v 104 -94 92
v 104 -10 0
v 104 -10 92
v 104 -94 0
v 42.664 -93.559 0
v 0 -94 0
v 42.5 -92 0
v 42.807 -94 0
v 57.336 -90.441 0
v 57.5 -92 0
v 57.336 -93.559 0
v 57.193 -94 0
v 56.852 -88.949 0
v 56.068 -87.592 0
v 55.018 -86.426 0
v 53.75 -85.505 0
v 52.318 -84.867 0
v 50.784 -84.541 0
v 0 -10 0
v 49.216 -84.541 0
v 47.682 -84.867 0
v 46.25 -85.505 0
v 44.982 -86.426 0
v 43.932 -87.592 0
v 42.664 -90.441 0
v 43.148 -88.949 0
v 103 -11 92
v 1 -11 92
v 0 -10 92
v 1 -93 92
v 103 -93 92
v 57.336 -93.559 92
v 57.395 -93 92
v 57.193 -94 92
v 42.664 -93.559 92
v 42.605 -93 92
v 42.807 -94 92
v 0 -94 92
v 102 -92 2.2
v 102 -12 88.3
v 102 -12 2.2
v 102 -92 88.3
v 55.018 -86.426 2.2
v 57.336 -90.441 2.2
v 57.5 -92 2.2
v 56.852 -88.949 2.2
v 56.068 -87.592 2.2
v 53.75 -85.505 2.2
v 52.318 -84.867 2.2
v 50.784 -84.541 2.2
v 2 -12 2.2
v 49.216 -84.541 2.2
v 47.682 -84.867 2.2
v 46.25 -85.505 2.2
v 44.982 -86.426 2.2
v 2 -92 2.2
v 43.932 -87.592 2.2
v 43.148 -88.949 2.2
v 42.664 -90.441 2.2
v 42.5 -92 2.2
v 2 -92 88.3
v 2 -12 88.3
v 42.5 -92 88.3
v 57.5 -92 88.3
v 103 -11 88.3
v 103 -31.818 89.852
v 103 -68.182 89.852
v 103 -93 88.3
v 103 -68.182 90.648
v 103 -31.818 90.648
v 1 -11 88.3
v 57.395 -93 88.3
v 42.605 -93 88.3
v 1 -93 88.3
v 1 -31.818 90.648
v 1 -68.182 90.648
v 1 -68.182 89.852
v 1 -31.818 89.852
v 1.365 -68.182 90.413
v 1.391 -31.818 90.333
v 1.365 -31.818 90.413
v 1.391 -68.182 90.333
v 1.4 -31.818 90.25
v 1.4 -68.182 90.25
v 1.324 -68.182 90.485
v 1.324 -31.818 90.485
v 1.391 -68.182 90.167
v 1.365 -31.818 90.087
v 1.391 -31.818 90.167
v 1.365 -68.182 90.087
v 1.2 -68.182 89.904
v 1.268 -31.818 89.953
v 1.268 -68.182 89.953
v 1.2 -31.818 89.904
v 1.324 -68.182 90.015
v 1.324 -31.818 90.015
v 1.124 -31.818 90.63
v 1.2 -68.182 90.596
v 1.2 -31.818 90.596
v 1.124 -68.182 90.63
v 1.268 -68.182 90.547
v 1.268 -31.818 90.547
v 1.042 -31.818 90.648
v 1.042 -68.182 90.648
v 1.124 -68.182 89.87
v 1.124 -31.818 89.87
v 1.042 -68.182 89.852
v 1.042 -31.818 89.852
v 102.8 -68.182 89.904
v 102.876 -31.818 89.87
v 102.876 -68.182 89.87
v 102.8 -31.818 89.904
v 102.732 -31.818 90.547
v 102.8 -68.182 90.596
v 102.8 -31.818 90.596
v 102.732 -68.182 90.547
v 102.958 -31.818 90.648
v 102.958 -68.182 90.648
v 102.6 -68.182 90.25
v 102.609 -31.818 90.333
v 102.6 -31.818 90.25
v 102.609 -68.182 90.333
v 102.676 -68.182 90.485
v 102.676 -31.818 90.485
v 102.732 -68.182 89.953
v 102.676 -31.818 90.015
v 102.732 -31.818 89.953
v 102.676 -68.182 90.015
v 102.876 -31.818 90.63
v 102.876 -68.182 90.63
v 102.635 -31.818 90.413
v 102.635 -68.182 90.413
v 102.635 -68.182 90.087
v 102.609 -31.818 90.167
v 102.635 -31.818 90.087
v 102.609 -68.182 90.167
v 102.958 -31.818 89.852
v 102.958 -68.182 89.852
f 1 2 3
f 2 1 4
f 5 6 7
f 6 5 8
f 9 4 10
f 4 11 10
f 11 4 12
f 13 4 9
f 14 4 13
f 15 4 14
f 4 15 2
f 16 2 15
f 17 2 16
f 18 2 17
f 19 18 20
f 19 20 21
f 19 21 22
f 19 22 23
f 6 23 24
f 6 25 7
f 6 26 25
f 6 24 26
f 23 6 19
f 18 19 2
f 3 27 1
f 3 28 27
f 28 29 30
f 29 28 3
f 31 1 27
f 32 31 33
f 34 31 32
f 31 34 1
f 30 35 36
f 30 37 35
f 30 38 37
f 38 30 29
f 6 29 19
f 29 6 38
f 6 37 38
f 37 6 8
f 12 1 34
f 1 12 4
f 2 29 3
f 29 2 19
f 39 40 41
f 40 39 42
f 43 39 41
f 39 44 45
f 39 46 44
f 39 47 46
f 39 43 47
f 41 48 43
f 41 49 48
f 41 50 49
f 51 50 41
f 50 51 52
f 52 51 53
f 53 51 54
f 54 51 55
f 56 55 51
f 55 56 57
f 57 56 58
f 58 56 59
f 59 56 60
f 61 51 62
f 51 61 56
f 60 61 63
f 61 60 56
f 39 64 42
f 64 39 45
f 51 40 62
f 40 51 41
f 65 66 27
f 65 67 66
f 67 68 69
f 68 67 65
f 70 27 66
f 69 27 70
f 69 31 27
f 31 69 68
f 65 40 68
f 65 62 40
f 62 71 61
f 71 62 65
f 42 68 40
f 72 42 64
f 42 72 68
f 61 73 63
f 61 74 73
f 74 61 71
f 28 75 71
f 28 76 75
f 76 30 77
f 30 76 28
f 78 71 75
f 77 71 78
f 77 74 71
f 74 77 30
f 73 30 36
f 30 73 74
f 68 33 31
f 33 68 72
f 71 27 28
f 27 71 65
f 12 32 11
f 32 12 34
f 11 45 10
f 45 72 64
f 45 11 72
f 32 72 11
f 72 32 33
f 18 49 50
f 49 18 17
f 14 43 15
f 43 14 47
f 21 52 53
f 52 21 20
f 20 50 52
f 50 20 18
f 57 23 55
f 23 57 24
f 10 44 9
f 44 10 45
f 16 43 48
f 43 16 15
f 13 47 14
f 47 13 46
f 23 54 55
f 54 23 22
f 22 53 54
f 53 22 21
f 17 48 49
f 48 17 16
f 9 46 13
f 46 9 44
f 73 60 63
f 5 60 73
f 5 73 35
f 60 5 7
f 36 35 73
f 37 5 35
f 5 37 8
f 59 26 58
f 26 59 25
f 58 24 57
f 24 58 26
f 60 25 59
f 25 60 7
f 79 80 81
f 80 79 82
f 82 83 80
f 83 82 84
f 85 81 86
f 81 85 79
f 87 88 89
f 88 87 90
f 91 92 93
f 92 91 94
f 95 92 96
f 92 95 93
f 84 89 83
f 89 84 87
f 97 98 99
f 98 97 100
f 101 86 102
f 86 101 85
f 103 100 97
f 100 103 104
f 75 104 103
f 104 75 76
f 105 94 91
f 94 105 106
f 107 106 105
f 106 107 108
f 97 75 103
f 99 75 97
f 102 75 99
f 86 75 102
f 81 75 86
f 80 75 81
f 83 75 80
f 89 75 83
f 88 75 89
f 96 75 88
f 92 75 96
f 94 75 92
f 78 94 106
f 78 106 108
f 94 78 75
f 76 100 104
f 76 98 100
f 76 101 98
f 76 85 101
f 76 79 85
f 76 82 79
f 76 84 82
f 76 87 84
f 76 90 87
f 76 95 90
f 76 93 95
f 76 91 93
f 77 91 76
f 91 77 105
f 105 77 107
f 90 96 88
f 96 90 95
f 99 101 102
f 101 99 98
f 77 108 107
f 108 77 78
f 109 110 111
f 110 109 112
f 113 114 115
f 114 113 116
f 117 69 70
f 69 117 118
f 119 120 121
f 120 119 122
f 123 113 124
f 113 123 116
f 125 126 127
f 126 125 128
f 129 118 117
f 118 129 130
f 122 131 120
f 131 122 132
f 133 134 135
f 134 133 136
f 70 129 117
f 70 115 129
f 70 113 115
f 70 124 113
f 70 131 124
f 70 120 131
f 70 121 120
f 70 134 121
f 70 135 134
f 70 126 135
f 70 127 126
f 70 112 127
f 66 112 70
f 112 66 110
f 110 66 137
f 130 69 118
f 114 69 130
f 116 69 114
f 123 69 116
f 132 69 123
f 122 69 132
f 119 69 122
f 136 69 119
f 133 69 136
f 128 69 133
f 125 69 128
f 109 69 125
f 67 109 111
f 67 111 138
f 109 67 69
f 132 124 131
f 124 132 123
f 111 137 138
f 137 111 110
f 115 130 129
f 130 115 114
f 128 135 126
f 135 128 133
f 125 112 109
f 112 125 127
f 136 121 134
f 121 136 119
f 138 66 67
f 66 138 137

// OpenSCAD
wallthickness = 1; // this is the wall of the lip, the box is twice as thick
internalx = 100; // internal x dimension
internaly = 80; // internal y dimension
internalz = 60; // internal overall z dimension
internal_lidz=90; // this is taken of off the internalz for the bottom height and acts as the lid internal height
led_x = 62.4;
led_y = 40.2;
cable_hole = 6;
rotary_hole = 6.9/2;

lip_overlap = 3.5; // how much overlap between box and lid, this works as a default but can be shrunk as needed

//#############################
// INTERNAL VARIABLES, DO NOT MODIFY
internal_botz=internalz-lip_overlap*2;

actual_y=internaly+(4*wallthickness);
actual_x=internalx+(4*wallthickness);
actual_lidz=internal_lidz+(2*wallthickness);
actual_botz=internal_botz+(2*wallthickness);

lip_x = internalx+(2*wallthickness);
lip_y = internaly+(2*wallthickness);

echo(actual_y);
echo(actual_x);
echo(actual_lidz);
echo(internal_lidz);
echo(lip_x);
echo(lip_y);

//###########################
module led() {
  cube([led_x, led_y, lip_overlap+.3]);
}

module rotary() {
  cylinder(r = rotary_hole, h = actual_lidz+lip_overlap, $fn = 30);
}

module bottom() {
  difference() {
    union() {
      cube([actual_x,actual_y,actual_botz]);
      translate([wallthickness,wallthickness,actual_botz])
        cube([lip_x,lip_y,lip_overlap]);
        
    }
    translate([(2*wallthickness),(2*wallthickness),(2*wallthickness)])
      cube([internalx,internaly,internalz]);

    // lock
    translate([wallthickness, internaly/4, actual_botz+lip_overlap/2])
      rotate([-90,0,0])
        cylinder(r = 0.5, h = internaly/2, $fn = 30);
    translate([lip_x+wallthickness, internaly/4, actual_botz+lip_overlap/2])
      rotate([-90,0,0])
        cylinder(r = 0.5, h = internaly/2, $fn = 30);


    translate([(2*wallthickness+internalx/2-led_x/2),(2*wallthickness+internaly/2-led_y/2),-0.1])
      rotate([0,0,0])
        led();

        
    translate([lip_x/5*1.5,5,35])
      rotate([90,0,0])
        rotary();
    translate([lip_x/5*3.5,5,35])
      rotate([90,0,0])
        rotary();
  }
}


module lid() {
  union() {
    difference() {
      cube([actual_x,actual_y,actual_lidz]);
      
      translate([(2*wallthickness),(2*wallthickness),-.1])
        cube([internalx,internaly,internal_lidz-.1]);
      
      translate([(wallthickness),(wallthickness),-.1])
        cube([lip_x,lip_y,lip_overlap+.3]);
      
      // passe cable
      translate([internalx/2,lip_y,-.1])
        cylinder(r = 7.5, h = actual_lidz+1, $fn = 30);
    }
    
    // lock
    translate([wallthickness, internaly/2-(internaly/2.2/2), lip_overlap/2])
      rotate([-90,0,0])
        cylinder(r = 0.4, h = internaly/2.2, $fn = 30);
    translate([internalx+wallthickness*3, internaly/2-(internaly/2.2/2), lip_overlap/2])
      rotate([-90,0,0])
        cylinder(r = 0.4, h = internaly/2.2, $fn = 30);
  }
}


*bottom();
translate([0,-10,actual_lidz])
  rotate([180,0,0])
    lid();
